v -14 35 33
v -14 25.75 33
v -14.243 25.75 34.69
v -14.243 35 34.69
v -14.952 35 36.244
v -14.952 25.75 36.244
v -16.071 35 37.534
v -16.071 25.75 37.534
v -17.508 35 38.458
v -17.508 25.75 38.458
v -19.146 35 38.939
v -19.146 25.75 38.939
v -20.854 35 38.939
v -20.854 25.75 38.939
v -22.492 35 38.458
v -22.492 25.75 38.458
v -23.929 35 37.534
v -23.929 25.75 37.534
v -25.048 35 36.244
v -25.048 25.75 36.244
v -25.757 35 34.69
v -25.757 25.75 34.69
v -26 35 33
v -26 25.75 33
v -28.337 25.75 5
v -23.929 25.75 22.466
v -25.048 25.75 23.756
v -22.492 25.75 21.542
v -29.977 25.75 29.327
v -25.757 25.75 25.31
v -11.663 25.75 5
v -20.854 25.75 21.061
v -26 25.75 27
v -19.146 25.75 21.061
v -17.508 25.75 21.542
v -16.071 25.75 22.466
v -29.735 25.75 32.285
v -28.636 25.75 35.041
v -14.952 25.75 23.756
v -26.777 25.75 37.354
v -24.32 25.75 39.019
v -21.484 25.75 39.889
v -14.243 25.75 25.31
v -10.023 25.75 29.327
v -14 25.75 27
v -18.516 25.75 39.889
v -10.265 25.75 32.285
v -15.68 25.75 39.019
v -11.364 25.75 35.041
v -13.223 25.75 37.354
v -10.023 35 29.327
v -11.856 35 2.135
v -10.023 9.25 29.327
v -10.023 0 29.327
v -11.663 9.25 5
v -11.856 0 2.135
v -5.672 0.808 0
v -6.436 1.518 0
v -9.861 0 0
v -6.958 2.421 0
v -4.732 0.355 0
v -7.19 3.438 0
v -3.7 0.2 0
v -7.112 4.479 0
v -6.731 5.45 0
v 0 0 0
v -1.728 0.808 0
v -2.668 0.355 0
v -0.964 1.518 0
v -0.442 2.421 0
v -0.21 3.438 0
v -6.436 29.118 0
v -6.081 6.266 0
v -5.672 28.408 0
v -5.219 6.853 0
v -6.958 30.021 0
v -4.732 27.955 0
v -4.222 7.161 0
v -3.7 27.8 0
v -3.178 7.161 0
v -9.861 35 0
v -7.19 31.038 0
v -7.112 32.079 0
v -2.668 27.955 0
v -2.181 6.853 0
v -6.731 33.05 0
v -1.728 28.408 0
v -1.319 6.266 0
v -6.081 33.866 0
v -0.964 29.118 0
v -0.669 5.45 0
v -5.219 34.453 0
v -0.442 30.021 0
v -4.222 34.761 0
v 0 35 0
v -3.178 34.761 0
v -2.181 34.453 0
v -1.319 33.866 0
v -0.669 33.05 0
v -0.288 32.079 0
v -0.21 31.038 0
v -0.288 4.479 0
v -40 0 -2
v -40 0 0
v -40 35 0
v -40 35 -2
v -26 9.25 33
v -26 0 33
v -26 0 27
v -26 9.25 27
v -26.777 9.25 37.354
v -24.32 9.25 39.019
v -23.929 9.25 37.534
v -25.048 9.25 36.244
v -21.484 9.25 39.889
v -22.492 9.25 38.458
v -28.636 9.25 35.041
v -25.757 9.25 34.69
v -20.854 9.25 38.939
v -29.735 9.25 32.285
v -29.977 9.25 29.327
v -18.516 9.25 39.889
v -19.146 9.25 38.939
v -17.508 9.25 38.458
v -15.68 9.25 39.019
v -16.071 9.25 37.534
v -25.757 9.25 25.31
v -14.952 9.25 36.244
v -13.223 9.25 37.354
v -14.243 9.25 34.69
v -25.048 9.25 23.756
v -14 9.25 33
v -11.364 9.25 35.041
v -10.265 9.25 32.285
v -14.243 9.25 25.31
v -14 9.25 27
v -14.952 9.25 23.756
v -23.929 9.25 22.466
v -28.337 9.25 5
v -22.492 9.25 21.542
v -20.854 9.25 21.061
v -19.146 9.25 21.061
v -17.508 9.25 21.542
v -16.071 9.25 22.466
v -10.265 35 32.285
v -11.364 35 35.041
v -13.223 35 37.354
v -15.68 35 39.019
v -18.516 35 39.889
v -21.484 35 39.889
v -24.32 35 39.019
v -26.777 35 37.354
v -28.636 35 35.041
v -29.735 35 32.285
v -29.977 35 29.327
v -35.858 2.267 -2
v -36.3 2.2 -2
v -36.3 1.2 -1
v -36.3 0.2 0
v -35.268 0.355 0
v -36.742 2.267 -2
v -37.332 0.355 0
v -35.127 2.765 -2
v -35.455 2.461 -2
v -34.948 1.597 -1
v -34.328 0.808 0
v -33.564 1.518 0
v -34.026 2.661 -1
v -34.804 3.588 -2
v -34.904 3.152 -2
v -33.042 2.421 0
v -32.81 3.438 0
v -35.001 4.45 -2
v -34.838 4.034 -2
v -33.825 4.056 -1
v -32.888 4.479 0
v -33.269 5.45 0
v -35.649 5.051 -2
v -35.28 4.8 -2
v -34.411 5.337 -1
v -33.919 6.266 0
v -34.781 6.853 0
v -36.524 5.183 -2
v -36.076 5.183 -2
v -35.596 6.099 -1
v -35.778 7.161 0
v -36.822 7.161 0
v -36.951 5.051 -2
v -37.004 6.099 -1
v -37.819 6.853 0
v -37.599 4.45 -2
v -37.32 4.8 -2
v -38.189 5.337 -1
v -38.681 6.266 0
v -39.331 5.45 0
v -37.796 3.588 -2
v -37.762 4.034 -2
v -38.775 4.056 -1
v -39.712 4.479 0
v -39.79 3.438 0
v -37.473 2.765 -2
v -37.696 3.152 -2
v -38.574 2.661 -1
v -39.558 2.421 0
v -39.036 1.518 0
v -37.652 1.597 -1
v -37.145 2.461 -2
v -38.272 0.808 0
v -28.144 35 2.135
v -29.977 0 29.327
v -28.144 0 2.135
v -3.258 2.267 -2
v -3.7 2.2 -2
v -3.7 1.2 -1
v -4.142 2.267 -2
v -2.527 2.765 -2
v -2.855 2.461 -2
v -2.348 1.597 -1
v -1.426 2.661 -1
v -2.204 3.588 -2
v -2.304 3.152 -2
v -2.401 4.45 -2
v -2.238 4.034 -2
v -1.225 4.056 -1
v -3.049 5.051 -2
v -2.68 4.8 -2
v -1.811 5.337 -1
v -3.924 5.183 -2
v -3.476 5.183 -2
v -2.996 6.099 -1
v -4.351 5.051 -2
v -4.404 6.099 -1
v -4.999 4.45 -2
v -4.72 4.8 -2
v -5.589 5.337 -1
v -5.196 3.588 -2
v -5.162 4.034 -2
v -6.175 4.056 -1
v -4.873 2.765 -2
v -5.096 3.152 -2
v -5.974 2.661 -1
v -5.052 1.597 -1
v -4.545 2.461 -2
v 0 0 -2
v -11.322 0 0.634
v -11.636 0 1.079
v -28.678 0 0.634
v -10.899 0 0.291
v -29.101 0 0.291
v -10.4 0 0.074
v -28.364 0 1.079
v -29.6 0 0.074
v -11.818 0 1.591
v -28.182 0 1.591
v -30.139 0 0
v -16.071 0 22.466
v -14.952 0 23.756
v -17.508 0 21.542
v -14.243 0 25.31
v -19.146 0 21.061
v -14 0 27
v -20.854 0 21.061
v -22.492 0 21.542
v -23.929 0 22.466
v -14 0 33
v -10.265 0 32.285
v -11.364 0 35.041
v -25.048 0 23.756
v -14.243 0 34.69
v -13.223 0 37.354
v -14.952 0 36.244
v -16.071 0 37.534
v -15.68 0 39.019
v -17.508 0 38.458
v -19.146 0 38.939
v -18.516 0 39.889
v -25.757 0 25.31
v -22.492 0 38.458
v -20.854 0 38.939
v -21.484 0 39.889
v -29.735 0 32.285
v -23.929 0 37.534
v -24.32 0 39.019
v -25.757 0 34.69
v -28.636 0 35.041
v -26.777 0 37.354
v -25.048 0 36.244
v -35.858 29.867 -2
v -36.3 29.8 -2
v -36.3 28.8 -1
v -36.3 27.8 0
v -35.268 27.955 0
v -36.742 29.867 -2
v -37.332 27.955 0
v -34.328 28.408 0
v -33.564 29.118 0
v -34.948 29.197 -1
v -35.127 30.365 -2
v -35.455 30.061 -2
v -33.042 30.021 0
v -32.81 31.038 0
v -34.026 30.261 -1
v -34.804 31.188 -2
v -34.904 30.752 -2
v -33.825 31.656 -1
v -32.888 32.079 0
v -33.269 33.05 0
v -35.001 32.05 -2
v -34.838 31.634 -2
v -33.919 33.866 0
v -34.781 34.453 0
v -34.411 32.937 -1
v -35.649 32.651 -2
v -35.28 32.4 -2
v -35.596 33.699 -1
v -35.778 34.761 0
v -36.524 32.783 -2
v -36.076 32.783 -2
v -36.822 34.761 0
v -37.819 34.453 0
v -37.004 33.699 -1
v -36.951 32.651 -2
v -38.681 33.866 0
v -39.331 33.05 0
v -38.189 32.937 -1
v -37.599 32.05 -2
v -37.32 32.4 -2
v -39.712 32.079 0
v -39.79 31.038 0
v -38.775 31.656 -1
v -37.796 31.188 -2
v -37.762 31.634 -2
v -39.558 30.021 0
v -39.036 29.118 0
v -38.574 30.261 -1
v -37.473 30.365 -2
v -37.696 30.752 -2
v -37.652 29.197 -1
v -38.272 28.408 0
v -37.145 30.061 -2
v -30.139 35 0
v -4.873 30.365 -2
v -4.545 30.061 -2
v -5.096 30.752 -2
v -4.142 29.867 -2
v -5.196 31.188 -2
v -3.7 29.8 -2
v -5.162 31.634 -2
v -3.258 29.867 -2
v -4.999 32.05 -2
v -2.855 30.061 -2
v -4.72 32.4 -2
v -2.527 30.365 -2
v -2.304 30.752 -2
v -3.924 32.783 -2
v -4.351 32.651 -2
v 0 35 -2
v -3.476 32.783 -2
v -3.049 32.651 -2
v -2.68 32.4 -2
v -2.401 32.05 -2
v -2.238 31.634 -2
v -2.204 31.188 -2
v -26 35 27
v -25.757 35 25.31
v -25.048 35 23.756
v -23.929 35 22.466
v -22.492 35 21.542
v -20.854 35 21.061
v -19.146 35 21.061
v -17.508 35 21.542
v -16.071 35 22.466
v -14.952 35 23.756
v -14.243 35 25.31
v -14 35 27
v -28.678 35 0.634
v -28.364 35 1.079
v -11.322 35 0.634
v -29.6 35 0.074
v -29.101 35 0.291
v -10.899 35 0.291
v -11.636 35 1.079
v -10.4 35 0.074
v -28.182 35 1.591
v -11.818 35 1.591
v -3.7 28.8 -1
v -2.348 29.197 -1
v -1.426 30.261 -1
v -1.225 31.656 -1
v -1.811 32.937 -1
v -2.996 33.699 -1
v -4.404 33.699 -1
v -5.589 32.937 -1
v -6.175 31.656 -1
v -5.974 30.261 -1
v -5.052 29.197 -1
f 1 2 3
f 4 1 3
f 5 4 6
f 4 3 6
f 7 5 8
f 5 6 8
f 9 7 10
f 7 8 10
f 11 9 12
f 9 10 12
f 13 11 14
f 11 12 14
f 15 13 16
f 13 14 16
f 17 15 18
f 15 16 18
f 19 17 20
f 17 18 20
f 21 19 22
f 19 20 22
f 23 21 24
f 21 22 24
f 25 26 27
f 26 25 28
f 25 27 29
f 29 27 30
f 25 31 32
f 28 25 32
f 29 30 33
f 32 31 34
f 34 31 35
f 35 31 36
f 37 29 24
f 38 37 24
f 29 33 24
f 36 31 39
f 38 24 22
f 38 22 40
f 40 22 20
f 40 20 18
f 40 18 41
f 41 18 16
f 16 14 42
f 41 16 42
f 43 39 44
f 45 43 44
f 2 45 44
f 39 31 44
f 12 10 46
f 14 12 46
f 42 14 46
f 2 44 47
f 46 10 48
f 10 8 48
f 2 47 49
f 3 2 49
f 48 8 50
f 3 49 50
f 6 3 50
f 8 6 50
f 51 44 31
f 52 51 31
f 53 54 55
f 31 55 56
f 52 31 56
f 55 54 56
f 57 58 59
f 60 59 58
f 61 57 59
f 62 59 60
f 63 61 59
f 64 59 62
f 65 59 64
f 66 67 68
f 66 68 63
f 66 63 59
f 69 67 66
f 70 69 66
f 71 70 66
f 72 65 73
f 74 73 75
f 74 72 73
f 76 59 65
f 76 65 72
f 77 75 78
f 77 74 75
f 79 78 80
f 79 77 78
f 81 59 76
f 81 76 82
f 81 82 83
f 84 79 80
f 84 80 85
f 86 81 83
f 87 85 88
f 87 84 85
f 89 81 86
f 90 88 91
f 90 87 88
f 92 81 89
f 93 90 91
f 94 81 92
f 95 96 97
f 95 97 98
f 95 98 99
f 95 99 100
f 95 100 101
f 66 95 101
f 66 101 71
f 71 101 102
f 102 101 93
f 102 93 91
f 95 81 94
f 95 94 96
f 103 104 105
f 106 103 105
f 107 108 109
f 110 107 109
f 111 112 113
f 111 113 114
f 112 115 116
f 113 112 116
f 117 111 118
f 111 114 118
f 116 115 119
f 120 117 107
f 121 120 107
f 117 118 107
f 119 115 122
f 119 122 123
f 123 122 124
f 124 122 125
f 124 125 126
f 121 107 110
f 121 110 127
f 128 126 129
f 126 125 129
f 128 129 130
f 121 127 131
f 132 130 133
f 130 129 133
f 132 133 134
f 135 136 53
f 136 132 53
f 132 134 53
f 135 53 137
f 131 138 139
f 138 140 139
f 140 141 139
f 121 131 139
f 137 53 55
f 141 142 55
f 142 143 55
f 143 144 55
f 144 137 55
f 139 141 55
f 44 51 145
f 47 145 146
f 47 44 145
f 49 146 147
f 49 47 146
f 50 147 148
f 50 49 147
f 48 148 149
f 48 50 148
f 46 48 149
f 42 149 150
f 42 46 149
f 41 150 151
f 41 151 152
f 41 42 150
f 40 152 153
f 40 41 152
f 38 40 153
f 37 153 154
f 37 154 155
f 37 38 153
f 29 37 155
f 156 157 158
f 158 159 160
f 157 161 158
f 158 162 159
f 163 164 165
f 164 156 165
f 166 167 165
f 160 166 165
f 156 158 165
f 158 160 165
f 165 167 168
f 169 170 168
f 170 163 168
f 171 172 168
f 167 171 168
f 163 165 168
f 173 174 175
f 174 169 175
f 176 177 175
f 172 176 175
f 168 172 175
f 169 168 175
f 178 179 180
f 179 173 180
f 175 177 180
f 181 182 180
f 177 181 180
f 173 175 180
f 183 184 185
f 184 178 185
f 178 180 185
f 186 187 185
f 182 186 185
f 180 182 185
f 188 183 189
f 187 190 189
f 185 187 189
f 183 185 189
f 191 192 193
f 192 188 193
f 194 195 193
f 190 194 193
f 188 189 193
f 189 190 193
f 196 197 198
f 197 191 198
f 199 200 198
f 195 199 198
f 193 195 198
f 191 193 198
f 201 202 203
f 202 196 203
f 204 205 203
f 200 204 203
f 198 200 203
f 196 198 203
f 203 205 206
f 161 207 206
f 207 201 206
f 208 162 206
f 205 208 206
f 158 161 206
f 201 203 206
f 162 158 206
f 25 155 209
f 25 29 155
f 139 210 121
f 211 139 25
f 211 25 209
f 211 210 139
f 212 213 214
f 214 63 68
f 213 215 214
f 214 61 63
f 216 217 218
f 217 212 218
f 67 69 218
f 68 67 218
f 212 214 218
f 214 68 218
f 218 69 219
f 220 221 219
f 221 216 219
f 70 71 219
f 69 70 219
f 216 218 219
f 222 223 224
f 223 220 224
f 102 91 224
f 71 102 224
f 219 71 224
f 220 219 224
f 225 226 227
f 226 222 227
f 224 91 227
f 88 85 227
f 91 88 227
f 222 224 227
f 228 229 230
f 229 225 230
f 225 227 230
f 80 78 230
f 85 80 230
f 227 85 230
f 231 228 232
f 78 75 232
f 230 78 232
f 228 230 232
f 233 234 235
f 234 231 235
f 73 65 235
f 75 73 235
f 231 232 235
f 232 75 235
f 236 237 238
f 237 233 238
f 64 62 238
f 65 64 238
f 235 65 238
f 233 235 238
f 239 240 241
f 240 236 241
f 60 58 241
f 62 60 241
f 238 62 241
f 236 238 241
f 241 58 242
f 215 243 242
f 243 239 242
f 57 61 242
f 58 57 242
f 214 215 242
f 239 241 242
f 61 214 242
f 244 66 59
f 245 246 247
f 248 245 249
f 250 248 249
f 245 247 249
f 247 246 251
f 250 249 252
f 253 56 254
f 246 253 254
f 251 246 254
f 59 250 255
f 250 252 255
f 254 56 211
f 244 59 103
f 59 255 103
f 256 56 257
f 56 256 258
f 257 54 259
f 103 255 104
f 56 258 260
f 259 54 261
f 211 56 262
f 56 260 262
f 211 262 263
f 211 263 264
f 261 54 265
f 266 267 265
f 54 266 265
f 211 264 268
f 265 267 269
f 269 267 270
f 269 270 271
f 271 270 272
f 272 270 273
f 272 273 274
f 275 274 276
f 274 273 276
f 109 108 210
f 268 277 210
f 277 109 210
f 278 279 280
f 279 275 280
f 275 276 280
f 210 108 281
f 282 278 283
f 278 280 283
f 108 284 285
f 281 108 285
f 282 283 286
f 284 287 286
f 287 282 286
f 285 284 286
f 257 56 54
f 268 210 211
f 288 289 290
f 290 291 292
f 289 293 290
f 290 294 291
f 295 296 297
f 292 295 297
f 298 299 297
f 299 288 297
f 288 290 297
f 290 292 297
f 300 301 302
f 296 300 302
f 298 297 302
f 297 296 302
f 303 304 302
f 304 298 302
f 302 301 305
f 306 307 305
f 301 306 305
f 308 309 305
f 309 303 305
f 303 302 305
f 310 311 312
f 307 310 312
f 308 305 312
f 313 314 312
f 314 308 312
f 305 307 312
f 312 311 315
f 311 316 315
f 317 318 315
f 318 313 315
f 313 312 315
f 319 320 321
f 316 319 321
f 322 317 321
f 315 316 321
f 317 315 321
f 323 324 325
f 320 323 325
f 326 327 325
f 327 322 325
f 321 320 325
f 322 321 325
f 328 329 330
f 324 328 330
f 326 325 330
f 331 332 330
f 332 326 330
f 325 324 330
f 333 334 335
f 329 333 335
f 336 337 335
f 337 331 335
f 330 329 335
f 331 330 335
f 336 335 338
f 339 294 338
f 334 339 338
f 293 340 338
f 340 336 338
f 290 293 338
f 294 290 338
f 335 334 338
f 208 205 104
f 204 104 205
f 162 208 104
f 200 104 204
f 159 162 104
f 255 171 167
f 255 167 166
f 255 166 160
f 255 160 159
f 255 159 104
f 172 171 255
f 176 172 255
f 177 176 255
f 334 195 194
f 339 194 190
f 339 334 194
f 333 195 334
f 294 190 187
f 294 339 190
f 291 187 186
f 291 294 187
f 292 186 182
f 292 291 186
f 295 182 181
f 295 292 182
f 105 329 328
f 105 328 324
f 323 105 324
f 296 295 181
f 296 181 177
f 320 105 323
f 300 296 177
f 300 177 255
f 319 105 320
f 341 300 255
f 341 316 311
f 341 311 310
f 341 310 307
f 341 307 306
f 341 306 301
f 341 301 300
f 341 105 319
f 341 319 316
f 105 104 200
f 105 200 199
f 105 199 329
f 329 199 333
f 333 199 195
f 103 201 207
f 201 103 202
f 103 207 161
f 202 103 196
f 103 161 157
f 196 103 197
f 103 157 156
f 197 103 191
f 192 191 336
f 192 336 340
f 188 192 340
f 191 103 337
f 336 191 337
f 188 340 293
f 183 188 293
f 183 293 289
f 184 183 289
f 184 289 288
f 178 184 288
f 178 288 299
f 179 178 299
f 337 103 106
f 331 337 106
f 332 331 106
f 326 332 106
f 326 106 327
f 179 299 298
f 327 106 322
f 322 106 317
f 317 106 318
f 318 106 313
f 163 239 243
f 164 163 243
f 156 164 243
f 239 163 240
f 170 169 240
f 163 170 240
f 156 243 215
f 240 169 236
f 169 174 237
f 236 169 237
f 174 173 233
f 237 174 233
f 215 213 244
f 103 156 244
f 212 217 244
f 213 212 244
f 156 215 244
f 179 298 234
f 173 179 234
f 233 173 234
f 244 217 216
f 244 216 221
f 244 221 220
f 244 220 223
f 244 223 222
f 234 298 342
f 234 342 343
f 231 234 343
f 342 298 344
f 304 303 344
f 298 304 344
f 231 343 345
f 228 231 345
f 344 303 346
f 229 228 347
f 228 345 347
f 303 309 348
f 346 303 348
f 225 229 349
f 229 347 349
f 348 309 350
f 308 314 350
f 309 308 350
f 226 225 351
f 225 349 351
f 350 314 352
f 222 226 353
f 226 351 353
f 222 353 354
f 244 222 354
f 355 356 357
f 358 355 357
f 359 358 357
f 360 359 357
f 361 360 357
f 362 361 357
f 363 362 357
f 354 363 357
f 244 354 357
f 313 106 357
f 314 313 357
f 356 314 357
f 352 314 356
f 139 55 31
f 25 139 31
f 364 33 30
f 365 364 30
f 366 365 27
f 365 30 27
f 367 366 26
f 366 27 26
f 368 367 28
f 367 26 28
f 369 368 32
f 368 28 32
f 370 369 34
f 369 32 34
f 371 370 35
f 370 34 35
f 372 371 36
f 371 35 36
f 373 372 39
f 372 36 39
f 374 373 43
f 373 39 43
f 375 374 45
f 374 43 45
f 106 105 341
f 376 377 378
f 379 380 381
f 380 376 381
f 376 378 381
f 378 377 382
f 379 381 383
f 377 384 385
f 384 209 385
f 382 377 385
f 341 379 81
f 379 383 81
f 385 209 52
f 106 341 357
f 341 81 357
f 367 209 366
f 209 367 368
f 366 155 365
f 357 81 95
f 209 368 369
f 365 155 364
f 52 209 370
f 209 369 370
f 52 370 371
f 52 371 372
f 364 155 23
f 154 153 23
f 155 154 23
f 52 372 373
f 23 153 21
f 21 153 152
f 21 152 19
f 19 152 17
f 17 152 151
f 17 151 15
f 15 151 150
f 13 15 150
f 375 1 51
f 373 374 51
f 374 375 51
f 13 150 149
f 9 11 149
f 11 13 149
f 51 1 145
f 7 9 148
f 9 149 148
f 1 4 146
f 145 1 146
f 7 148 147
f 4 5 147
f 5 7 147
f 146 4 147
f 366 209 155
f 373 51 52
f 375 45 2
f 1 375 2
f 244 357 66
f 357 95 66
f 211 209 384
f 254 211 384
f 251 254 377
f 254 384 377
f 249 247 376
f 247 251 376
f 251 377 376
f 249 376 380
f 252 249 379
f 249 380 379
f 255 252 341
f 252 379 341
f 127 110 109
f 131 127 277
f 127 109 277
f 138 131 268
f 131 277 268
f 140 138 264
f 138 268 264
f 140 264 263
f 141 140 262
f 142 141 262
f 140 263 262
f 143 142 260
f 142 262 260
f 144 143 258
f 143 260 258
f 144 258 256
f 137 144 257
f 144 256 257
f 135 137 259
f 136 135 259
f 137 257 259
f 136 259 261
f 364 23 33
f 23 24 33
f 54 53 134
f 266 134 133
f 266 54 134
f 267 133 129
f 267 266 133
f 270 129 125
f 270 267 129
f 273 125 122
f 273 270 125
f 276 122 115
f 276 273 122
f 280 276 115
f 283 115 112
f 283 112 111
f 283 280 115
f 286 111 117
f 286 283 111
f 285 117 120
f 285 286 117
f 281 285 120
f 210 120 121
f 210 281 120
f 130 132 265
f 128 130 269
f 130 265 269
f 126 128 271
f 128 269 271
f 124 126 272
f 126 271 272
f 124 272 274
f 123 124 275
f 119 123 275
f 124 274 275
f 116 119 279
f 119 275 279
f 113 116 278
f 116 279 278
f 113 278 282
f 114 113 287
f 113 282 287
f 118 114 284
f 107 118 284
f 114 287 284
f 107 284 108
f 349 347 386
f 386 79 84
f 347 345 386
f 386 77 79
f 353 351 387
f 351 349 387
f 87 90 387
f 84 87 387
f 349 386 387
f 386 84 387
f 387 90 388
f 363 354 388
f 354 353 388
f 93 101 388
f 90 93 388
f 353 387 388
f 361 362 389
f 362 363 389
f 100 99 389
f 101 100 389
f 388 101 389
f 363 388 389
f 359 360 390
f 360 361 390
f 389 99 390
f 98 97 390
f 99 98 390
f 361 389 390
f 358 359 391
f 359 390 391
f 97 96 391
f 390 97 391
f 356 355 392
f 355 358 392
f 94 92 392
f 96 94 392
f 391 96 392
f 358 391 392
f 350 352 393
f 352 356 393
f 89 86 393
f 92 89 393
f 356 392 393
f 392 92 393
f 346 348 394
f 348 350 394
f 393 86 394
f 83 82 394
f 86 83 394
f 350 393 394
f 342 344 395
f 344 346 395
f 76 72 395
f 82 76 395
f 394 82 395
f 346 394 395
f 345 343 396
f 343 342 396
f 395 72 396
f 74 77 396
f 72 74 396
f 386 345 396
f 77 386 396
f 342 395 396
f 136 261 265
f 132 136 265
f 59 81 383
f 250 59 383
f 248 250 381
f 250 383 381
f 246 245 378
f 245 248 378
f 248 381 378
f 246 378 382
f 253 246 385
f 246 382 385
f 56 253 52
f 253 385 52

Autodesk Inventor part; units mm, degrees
ref_plane "YZ Plane" through (0, 0, 0) normal (1, 0, 0) x (0, 1, 0)
ref_plane "XZ Plane" through (0, 0, 0) normal (0, 1, 0) x (-1, 0, 0)
ref_plane "XY Plane" through (0, 0, 0) normal (0, 0, 1) x (1, 0, 0)
sketch "Skizze3" plane through (0, 0, 0) normal (0, 0, 1) x (1, 0, 0)
  line L0 (0, 0) -> (-40, 0)
  line L1 (-40, 0) -> (-40, 35)
  line L2 (-40, 35) -> (0, 35)
  line L3 (0, 35) -> (0, 0)
  point P0 (-3.7, 3.7)
  dimension "d4" = 35
  dimension "d5" = 40
  dimension "d6" = 3.7
  dimension "d7" = 3.7
sketch "Skizze4" plane through (0, 0, 0) normal (0, 1, 0) x (-1, 0, 0)
  line L0 (0, 0) -> (40, 0) projected
  line L1 (20, 0) -> (20, 40)
  line L2 (20, 33) -> (20, 27) construction
  line L3 (26, 33) -> (26, 27)
  line L4 (14, 27) -> (14, 33)
  arc A0 (26, 33) -> (14, 33) centre (20, 33) ccw
  arc A1 (14, 27) -> (26, 27) centre (20, 27) ccw
  circle A2 centre (20, 30) radius 10
  line L5 (29.9773, 29.3273) -> (28, 0)
  line L6 (10.0227, 29.3273) -> (12, 0)
  dimension "d8" = 40
  dimension "d9" = 10
  dimension "d10" = 12
  dimension "d11" = 6
  dimension "d12" = 8
  dimension "d13" = 8
extrude "Extrusion3" add sketch "Skizze4" along normal blind 35 contours L6 A2 L1 L0 | L1 A2 L5 L0 | A2 L1 A0 L4 A1 | L1 A1 L3 A0 A2
extrude "Extrusion4" add sketch "Skizze3" against normal blind 2
hole "Bohrung1" at (-3.7, 3.7, 0) direction (0, 0, -1) diameter 2.459 depth 8.8 countersink diameter 7 countersink angle 90 thread size "M3x0.5" class "6H" standard "ISO Metric profile"
sketch "Skizze5" plane through (0, 0, 0) normal (1, 0, 0) x (0, 0, -1)
  line L0 (-40, 0) -> (-40, 35) projected
  line L1 (-40, 9.25) -> (-5, 9.25)
  line L2 (-5, 9.25) -> (-5, 25.75)
  line L3 (-5, 25.75) -> (-40, 25.75)
  line L4 (-40, 25.75) -> (-40, 9.25)
  point P0 (0, 0)
  point P1 (-40, 17.5)
  dimension "d25" = 16.5
  dimension "d26" = 35
extrude "Extrusion5" cut sketch "Skizze5" against normal through all
pattern_linear "Rechteckige Anordnung1" count 2 spacing 32.6 along (-1, 0, 0) count 2 spacing 27.6 along (0, 1, 0) of "Bohrung1"
fillet "Rundung2" radius 2 2 edges at (-12, 17.5, 0) (-28, 17.5, 0)
equation "\"d7\" = d6"
equation "\"d13\" = d12"
equation "\"d14\" = d4"
equation "\"d31\" = d5 - 2 * d6"
equation "\"d34\" = d4 - 2 * d7"
properties part number "BT101_trajan20_21" material "Kunststoff, undurchsichtig Schwarz"
